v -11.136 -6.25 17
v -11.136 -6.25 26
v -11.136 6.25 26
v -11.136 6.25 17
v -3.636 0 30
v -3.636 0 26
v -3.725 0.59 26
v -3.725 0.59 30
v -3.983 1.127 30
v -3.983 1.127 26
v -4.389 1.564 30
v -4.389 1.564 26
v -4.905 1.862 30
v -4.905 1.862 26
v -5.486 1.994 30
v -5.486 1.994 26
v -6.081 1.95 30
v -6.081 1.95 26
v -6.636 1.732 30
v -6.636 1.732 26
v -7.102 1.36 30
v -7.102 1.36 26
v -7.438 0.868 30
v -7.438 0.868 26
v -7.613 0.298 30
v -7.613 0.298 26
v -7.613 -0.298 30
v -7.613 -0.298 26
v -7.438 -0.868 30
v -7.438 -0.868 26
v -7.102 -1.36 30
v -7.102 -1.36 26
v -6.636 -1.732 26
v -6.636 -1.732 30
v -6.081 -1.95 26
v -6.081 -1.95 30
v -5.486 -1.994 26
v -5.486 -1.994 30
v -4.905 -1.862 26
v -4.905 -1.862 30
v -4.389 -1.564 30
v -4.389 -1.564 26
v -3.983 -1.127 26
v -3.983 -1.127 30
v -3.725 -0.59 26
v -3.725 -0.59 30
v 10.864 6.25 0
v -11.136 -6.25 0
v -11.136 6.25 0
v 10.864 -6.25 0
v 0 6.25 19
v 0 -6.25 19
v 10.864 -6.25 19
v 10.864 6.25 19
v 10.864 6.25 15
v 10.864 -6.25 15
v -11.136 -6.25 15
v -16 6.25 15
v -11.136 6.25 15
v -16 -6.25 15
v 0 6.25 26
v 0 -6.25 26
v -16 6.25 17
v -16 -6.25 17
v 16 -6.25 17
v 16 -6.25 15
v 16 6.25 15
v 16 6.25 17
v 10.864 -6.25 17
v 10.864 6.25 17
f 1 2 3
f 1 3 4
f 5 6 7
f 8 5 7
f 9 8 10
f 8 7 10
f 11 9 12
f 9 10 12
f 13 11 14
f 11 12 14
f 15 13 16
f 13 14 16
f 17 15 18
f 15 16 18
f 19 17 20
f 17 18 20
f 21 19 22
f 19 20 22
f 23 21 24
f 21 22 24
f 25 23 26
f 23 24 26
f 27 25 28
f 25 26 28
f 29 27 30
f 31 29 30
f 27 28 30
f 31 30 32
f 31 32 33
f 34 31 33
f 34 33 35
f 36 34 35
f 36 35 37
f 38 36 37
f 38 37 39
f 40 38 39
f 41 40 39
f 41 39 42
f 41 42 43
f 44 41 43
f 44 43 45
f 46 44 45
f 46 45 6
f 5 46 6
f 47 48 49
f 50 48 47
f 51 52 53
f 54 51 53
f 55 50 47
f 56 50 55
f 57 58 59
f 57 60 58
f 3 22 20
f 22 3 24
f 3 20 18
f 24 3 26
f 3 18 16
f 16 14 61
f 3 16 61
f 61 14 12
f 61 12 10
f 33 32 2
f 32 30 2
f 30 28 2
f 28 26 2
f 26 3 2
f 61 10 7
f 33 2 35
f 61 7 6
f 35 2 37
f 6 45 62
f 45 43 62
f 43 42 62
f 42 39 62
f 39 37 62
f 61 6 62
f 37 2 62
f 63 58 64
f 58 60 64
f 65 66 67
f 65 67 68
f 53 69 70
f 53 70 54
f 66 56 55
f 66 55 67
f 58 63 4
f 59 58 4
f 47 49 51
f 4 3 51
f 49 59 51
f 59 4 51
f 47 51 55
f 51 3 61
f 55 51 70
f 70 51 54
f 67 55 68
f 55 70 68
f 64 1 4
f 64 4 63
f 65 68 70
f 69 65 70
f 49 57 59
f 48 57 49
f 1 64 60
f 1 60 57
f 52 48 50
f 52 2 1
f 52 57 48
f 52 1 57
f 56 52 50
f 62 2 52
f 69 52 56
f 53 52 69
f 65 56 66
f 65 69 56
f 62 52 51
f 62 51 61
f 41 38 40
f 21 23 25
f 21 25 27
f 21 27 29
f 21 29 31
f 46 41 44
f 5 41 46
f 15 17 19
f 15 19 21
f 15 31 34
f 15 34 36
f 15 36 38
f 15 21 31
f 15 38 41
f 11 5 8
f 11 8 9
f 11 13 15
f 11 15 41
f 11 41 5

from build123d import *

# Parameters (mm, degrees)
F0_W     = 11.1358017506
F0_H     = 15
F0_W_2   = 10.8641982494
F0_H_2   = 2
F0_W_3   = 4.8641982494
F0_W_4   = 5.1358017506
F0_H_3   = 7
F1_DEPTH = 6.25
F2_R     = 2
F3_DEPTH = 11


with BuildPart() as f1:
    # F0 (on Front) → F1 (new body, symmetric)
    with BuildSketch(Plane.XZ):
        with Locations((-5.5679008753, 7.5)):
            Rectangle(F0_W, F0_H)
        with Locations((5.4320991247, 16)):
            Rectangle(F0_W_2, F0_H_2)
        with Locations((-5.5679008753, 16)):
            Rectangle(F0_W, F0_H_2)
        with Locations((-13.5679008753, 16)):
            Rectangle(F0_W_3, F0_H_2)
        with Locations((5.4320991247, 7.5)):
            Rectangle(F0_W_2, F0_H)
        with Locations((13.4320991247, 16)):
            Rectangle(F0_W_4, F0_H_2)
        with Locations((5.4320991247, 18)):
            Rectangle(F0_W_2, F0_H_2)
        with Locations((-5.5679008753, 22.5)):
            Rectangle(F0_W, F0_H_3)
        with Locations((-5.5679008753, 18)):
            Rectangle(F0_W, F0_H_2)
    extrude(amount=F1_DEPTH, both=True)

    # F2 (on face) → F3 (join)
    with BuildSketch(Plane.XY.offset(19)):
        with Locations((-5.6358017506, 0)):
            Circle(F2_R)
    extrude(amount=F3_DEPTH)


solid = f1.part
